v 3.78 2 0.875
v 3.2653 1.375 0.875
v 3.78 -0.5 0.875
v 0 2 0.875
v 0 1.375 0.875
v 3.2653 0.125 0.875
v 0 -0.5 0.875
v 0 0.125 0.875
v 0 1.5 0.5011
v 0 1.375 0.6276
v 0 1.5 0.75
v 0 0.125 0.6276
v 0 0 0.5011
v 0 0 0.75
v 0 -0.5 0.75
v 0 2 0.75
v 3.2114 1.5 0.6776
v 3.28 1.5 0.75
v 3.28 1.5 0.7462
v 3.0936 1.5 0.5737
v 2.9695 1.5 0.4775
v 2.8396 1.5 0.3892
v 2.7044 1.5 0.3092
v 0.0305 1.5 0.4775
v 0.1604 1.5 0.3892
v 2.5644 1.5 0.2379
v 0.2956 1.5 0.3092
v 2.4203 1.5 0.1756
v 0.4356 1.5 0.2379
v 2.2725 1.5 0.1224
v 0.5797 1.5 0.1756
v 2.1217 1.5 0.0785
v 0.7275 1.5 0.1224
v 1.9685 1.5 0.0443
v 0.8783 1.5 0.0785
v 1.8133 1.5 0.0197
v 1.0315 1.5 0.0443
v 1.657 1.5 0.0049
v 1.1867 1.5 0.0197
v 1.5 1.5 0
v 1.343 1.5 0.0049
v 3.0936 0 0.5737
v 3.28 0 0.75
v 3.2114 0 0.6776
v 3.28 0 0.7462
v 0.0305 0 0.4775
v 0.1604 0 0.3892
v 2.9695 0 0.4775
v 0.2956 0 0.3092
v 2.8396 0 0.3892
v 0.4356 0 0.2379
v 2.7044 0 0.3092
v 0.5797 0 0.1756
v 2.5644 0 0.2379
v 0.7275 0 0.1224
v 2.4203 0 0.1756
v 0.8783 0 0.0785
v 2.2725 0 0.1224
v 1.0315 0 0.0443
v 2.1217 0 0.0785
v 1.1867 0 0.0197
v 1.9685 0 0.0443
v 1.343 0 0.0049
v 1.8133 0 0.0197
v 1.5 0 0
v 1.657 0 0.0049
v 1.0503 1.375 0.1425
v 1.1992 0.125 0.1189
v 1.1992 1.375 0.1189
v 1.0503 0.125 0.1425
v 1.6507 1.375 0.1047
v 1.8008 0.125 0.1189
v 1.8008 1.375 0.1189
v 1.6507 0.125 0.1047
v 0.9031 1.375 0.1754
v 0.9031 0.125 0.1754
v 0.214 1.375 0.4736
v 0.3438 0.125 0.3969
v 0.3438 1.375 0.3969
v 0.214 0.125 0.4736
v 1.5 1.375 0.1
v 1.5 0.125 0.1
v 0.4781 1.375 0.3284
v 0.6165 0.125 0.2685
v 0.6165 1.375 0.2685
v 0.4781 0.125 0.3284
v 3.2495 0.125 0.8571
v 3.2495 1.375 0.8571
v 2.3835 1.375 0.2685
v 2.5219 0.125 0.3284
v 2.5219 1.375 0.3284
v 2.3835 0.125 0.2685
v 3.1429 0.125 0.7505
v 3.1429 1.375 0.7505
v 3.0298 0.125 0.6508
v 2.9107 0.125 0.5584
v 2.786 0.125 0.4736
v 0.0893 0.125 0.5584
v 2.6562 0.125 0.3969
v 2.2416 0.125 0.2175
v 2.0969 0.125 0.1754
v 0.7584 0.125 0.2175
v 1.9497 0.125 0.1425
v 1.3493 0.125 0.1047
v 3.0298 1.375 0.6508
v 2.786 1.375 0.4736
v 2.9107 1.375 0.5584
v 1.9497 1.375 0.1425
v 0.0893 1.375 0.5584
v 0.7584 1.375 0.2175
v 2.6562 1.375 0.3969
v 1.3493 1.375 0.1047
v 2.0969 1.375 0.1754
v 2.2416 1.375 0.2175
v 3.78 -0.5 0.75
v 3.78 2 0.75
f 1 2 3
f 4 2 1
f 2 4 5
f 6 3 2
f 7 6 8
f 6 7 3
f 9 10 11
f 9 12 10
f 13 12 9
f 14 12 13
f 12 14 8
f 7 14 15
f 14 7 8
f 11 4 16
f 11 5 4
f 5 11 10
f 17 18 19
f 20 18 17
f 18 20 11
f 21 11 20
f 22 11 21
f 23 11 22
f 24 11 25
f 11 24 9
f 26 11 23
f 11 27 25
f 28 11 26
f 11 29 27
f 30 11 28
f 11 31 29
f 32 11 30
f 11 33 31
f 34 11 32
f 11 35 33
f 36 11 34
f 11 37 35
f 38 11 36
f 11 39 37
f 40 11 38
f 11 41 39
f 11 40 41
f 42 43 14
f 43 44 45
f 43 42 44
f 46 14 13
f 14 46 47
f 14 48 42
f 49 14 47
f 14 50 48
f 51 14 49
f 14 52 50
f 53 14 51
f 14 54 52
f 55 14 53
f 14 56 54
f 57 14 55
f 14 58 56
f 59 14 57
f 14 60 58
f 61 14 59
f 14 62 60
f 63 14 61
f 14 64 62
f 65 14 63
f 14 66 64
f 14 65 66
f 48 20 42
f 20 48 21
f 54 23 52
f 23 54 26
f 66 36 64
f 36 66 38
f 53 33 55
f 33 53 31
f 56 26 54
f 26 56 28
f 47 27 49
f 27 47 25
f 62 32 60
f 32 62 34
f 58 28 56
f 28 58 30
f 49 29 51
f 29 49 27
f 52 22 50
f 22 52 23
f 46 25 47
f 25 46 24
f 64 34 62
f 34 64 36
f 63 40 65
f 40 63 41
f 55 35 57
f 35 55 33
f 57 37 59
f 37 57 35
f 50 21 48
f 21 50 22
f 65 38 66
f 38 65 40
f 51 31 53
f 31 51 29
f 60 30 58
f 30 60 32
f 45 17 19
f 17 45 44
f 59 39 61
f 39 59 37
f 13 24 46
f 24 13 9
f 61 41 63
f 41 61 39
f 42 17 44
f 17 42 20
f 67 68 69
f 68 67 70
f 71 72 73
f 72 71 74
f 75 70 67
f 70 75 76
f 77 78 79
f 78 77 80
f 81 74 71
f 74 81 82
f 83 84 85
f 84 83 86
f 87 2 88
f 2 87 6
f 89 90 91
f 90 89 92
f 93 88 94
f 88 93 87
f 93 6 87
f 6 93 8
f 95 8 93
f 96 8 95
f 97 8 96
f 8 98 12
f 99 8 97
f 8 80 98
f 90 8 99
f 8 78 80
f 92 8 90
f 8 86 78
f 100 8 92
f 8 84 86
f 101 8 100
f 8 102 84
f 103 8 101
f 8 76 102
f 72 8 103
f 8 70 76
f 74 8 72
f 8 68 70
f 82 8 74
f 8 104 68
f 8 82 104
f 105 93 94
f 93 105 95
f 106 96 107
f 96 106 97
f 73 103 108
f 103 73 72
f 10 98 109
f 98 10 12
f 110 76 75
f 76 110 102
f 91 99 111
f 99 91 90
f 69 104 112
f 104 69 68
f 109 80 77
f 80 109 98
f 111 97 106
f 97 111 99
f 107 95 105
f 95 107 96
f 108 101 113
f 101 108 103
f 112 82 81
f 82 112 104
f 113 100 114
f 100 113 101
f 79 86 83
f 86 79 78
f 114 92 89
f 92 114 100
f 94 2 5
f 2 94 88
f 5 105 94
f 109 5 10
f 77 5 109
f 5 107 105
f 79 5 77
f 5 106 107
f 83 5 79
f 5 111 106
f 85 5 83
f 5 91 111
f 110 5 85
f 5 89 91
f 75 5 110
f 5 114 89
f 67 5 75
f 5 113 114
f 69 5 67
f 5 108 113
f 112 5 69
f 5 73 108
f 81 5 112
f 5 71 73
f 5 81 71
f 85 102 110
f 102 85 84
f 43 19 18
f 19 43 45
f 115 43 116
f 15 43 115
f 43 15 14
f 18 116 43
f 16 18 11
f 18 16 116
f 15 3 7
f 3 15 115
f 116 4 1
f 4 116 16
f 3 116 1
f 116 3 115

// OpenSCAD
$fn=100;

wall = 0.125;

flange = 0.5;

rotate([0,0,0]) difference() {
    intersection() {
        cube([3.75+wall,1.25+wall*2,7/8]);
translate([1.5,5,1+5/8+7/8]) rotate([90,0,0]) cylinder(r=2.5,h=10);
    
    }

translate([1.5,1.25+wall,1+5/8+7/8]) rotate([90,0,0]) cylinder(r=2.4,h=1.25);
    
    translate([3.28,-1,0]) cube([10,10,10]);

}


translate([0,-flange,6/8]) cube([3.28,flange,0.125]);

translate([0,1.25+2*wall,6/8]) cube([3.28,flange,0.125]);

translate([3.28,-flange,6/8]) cube([flange,1.5+flange*2,0.125]);
